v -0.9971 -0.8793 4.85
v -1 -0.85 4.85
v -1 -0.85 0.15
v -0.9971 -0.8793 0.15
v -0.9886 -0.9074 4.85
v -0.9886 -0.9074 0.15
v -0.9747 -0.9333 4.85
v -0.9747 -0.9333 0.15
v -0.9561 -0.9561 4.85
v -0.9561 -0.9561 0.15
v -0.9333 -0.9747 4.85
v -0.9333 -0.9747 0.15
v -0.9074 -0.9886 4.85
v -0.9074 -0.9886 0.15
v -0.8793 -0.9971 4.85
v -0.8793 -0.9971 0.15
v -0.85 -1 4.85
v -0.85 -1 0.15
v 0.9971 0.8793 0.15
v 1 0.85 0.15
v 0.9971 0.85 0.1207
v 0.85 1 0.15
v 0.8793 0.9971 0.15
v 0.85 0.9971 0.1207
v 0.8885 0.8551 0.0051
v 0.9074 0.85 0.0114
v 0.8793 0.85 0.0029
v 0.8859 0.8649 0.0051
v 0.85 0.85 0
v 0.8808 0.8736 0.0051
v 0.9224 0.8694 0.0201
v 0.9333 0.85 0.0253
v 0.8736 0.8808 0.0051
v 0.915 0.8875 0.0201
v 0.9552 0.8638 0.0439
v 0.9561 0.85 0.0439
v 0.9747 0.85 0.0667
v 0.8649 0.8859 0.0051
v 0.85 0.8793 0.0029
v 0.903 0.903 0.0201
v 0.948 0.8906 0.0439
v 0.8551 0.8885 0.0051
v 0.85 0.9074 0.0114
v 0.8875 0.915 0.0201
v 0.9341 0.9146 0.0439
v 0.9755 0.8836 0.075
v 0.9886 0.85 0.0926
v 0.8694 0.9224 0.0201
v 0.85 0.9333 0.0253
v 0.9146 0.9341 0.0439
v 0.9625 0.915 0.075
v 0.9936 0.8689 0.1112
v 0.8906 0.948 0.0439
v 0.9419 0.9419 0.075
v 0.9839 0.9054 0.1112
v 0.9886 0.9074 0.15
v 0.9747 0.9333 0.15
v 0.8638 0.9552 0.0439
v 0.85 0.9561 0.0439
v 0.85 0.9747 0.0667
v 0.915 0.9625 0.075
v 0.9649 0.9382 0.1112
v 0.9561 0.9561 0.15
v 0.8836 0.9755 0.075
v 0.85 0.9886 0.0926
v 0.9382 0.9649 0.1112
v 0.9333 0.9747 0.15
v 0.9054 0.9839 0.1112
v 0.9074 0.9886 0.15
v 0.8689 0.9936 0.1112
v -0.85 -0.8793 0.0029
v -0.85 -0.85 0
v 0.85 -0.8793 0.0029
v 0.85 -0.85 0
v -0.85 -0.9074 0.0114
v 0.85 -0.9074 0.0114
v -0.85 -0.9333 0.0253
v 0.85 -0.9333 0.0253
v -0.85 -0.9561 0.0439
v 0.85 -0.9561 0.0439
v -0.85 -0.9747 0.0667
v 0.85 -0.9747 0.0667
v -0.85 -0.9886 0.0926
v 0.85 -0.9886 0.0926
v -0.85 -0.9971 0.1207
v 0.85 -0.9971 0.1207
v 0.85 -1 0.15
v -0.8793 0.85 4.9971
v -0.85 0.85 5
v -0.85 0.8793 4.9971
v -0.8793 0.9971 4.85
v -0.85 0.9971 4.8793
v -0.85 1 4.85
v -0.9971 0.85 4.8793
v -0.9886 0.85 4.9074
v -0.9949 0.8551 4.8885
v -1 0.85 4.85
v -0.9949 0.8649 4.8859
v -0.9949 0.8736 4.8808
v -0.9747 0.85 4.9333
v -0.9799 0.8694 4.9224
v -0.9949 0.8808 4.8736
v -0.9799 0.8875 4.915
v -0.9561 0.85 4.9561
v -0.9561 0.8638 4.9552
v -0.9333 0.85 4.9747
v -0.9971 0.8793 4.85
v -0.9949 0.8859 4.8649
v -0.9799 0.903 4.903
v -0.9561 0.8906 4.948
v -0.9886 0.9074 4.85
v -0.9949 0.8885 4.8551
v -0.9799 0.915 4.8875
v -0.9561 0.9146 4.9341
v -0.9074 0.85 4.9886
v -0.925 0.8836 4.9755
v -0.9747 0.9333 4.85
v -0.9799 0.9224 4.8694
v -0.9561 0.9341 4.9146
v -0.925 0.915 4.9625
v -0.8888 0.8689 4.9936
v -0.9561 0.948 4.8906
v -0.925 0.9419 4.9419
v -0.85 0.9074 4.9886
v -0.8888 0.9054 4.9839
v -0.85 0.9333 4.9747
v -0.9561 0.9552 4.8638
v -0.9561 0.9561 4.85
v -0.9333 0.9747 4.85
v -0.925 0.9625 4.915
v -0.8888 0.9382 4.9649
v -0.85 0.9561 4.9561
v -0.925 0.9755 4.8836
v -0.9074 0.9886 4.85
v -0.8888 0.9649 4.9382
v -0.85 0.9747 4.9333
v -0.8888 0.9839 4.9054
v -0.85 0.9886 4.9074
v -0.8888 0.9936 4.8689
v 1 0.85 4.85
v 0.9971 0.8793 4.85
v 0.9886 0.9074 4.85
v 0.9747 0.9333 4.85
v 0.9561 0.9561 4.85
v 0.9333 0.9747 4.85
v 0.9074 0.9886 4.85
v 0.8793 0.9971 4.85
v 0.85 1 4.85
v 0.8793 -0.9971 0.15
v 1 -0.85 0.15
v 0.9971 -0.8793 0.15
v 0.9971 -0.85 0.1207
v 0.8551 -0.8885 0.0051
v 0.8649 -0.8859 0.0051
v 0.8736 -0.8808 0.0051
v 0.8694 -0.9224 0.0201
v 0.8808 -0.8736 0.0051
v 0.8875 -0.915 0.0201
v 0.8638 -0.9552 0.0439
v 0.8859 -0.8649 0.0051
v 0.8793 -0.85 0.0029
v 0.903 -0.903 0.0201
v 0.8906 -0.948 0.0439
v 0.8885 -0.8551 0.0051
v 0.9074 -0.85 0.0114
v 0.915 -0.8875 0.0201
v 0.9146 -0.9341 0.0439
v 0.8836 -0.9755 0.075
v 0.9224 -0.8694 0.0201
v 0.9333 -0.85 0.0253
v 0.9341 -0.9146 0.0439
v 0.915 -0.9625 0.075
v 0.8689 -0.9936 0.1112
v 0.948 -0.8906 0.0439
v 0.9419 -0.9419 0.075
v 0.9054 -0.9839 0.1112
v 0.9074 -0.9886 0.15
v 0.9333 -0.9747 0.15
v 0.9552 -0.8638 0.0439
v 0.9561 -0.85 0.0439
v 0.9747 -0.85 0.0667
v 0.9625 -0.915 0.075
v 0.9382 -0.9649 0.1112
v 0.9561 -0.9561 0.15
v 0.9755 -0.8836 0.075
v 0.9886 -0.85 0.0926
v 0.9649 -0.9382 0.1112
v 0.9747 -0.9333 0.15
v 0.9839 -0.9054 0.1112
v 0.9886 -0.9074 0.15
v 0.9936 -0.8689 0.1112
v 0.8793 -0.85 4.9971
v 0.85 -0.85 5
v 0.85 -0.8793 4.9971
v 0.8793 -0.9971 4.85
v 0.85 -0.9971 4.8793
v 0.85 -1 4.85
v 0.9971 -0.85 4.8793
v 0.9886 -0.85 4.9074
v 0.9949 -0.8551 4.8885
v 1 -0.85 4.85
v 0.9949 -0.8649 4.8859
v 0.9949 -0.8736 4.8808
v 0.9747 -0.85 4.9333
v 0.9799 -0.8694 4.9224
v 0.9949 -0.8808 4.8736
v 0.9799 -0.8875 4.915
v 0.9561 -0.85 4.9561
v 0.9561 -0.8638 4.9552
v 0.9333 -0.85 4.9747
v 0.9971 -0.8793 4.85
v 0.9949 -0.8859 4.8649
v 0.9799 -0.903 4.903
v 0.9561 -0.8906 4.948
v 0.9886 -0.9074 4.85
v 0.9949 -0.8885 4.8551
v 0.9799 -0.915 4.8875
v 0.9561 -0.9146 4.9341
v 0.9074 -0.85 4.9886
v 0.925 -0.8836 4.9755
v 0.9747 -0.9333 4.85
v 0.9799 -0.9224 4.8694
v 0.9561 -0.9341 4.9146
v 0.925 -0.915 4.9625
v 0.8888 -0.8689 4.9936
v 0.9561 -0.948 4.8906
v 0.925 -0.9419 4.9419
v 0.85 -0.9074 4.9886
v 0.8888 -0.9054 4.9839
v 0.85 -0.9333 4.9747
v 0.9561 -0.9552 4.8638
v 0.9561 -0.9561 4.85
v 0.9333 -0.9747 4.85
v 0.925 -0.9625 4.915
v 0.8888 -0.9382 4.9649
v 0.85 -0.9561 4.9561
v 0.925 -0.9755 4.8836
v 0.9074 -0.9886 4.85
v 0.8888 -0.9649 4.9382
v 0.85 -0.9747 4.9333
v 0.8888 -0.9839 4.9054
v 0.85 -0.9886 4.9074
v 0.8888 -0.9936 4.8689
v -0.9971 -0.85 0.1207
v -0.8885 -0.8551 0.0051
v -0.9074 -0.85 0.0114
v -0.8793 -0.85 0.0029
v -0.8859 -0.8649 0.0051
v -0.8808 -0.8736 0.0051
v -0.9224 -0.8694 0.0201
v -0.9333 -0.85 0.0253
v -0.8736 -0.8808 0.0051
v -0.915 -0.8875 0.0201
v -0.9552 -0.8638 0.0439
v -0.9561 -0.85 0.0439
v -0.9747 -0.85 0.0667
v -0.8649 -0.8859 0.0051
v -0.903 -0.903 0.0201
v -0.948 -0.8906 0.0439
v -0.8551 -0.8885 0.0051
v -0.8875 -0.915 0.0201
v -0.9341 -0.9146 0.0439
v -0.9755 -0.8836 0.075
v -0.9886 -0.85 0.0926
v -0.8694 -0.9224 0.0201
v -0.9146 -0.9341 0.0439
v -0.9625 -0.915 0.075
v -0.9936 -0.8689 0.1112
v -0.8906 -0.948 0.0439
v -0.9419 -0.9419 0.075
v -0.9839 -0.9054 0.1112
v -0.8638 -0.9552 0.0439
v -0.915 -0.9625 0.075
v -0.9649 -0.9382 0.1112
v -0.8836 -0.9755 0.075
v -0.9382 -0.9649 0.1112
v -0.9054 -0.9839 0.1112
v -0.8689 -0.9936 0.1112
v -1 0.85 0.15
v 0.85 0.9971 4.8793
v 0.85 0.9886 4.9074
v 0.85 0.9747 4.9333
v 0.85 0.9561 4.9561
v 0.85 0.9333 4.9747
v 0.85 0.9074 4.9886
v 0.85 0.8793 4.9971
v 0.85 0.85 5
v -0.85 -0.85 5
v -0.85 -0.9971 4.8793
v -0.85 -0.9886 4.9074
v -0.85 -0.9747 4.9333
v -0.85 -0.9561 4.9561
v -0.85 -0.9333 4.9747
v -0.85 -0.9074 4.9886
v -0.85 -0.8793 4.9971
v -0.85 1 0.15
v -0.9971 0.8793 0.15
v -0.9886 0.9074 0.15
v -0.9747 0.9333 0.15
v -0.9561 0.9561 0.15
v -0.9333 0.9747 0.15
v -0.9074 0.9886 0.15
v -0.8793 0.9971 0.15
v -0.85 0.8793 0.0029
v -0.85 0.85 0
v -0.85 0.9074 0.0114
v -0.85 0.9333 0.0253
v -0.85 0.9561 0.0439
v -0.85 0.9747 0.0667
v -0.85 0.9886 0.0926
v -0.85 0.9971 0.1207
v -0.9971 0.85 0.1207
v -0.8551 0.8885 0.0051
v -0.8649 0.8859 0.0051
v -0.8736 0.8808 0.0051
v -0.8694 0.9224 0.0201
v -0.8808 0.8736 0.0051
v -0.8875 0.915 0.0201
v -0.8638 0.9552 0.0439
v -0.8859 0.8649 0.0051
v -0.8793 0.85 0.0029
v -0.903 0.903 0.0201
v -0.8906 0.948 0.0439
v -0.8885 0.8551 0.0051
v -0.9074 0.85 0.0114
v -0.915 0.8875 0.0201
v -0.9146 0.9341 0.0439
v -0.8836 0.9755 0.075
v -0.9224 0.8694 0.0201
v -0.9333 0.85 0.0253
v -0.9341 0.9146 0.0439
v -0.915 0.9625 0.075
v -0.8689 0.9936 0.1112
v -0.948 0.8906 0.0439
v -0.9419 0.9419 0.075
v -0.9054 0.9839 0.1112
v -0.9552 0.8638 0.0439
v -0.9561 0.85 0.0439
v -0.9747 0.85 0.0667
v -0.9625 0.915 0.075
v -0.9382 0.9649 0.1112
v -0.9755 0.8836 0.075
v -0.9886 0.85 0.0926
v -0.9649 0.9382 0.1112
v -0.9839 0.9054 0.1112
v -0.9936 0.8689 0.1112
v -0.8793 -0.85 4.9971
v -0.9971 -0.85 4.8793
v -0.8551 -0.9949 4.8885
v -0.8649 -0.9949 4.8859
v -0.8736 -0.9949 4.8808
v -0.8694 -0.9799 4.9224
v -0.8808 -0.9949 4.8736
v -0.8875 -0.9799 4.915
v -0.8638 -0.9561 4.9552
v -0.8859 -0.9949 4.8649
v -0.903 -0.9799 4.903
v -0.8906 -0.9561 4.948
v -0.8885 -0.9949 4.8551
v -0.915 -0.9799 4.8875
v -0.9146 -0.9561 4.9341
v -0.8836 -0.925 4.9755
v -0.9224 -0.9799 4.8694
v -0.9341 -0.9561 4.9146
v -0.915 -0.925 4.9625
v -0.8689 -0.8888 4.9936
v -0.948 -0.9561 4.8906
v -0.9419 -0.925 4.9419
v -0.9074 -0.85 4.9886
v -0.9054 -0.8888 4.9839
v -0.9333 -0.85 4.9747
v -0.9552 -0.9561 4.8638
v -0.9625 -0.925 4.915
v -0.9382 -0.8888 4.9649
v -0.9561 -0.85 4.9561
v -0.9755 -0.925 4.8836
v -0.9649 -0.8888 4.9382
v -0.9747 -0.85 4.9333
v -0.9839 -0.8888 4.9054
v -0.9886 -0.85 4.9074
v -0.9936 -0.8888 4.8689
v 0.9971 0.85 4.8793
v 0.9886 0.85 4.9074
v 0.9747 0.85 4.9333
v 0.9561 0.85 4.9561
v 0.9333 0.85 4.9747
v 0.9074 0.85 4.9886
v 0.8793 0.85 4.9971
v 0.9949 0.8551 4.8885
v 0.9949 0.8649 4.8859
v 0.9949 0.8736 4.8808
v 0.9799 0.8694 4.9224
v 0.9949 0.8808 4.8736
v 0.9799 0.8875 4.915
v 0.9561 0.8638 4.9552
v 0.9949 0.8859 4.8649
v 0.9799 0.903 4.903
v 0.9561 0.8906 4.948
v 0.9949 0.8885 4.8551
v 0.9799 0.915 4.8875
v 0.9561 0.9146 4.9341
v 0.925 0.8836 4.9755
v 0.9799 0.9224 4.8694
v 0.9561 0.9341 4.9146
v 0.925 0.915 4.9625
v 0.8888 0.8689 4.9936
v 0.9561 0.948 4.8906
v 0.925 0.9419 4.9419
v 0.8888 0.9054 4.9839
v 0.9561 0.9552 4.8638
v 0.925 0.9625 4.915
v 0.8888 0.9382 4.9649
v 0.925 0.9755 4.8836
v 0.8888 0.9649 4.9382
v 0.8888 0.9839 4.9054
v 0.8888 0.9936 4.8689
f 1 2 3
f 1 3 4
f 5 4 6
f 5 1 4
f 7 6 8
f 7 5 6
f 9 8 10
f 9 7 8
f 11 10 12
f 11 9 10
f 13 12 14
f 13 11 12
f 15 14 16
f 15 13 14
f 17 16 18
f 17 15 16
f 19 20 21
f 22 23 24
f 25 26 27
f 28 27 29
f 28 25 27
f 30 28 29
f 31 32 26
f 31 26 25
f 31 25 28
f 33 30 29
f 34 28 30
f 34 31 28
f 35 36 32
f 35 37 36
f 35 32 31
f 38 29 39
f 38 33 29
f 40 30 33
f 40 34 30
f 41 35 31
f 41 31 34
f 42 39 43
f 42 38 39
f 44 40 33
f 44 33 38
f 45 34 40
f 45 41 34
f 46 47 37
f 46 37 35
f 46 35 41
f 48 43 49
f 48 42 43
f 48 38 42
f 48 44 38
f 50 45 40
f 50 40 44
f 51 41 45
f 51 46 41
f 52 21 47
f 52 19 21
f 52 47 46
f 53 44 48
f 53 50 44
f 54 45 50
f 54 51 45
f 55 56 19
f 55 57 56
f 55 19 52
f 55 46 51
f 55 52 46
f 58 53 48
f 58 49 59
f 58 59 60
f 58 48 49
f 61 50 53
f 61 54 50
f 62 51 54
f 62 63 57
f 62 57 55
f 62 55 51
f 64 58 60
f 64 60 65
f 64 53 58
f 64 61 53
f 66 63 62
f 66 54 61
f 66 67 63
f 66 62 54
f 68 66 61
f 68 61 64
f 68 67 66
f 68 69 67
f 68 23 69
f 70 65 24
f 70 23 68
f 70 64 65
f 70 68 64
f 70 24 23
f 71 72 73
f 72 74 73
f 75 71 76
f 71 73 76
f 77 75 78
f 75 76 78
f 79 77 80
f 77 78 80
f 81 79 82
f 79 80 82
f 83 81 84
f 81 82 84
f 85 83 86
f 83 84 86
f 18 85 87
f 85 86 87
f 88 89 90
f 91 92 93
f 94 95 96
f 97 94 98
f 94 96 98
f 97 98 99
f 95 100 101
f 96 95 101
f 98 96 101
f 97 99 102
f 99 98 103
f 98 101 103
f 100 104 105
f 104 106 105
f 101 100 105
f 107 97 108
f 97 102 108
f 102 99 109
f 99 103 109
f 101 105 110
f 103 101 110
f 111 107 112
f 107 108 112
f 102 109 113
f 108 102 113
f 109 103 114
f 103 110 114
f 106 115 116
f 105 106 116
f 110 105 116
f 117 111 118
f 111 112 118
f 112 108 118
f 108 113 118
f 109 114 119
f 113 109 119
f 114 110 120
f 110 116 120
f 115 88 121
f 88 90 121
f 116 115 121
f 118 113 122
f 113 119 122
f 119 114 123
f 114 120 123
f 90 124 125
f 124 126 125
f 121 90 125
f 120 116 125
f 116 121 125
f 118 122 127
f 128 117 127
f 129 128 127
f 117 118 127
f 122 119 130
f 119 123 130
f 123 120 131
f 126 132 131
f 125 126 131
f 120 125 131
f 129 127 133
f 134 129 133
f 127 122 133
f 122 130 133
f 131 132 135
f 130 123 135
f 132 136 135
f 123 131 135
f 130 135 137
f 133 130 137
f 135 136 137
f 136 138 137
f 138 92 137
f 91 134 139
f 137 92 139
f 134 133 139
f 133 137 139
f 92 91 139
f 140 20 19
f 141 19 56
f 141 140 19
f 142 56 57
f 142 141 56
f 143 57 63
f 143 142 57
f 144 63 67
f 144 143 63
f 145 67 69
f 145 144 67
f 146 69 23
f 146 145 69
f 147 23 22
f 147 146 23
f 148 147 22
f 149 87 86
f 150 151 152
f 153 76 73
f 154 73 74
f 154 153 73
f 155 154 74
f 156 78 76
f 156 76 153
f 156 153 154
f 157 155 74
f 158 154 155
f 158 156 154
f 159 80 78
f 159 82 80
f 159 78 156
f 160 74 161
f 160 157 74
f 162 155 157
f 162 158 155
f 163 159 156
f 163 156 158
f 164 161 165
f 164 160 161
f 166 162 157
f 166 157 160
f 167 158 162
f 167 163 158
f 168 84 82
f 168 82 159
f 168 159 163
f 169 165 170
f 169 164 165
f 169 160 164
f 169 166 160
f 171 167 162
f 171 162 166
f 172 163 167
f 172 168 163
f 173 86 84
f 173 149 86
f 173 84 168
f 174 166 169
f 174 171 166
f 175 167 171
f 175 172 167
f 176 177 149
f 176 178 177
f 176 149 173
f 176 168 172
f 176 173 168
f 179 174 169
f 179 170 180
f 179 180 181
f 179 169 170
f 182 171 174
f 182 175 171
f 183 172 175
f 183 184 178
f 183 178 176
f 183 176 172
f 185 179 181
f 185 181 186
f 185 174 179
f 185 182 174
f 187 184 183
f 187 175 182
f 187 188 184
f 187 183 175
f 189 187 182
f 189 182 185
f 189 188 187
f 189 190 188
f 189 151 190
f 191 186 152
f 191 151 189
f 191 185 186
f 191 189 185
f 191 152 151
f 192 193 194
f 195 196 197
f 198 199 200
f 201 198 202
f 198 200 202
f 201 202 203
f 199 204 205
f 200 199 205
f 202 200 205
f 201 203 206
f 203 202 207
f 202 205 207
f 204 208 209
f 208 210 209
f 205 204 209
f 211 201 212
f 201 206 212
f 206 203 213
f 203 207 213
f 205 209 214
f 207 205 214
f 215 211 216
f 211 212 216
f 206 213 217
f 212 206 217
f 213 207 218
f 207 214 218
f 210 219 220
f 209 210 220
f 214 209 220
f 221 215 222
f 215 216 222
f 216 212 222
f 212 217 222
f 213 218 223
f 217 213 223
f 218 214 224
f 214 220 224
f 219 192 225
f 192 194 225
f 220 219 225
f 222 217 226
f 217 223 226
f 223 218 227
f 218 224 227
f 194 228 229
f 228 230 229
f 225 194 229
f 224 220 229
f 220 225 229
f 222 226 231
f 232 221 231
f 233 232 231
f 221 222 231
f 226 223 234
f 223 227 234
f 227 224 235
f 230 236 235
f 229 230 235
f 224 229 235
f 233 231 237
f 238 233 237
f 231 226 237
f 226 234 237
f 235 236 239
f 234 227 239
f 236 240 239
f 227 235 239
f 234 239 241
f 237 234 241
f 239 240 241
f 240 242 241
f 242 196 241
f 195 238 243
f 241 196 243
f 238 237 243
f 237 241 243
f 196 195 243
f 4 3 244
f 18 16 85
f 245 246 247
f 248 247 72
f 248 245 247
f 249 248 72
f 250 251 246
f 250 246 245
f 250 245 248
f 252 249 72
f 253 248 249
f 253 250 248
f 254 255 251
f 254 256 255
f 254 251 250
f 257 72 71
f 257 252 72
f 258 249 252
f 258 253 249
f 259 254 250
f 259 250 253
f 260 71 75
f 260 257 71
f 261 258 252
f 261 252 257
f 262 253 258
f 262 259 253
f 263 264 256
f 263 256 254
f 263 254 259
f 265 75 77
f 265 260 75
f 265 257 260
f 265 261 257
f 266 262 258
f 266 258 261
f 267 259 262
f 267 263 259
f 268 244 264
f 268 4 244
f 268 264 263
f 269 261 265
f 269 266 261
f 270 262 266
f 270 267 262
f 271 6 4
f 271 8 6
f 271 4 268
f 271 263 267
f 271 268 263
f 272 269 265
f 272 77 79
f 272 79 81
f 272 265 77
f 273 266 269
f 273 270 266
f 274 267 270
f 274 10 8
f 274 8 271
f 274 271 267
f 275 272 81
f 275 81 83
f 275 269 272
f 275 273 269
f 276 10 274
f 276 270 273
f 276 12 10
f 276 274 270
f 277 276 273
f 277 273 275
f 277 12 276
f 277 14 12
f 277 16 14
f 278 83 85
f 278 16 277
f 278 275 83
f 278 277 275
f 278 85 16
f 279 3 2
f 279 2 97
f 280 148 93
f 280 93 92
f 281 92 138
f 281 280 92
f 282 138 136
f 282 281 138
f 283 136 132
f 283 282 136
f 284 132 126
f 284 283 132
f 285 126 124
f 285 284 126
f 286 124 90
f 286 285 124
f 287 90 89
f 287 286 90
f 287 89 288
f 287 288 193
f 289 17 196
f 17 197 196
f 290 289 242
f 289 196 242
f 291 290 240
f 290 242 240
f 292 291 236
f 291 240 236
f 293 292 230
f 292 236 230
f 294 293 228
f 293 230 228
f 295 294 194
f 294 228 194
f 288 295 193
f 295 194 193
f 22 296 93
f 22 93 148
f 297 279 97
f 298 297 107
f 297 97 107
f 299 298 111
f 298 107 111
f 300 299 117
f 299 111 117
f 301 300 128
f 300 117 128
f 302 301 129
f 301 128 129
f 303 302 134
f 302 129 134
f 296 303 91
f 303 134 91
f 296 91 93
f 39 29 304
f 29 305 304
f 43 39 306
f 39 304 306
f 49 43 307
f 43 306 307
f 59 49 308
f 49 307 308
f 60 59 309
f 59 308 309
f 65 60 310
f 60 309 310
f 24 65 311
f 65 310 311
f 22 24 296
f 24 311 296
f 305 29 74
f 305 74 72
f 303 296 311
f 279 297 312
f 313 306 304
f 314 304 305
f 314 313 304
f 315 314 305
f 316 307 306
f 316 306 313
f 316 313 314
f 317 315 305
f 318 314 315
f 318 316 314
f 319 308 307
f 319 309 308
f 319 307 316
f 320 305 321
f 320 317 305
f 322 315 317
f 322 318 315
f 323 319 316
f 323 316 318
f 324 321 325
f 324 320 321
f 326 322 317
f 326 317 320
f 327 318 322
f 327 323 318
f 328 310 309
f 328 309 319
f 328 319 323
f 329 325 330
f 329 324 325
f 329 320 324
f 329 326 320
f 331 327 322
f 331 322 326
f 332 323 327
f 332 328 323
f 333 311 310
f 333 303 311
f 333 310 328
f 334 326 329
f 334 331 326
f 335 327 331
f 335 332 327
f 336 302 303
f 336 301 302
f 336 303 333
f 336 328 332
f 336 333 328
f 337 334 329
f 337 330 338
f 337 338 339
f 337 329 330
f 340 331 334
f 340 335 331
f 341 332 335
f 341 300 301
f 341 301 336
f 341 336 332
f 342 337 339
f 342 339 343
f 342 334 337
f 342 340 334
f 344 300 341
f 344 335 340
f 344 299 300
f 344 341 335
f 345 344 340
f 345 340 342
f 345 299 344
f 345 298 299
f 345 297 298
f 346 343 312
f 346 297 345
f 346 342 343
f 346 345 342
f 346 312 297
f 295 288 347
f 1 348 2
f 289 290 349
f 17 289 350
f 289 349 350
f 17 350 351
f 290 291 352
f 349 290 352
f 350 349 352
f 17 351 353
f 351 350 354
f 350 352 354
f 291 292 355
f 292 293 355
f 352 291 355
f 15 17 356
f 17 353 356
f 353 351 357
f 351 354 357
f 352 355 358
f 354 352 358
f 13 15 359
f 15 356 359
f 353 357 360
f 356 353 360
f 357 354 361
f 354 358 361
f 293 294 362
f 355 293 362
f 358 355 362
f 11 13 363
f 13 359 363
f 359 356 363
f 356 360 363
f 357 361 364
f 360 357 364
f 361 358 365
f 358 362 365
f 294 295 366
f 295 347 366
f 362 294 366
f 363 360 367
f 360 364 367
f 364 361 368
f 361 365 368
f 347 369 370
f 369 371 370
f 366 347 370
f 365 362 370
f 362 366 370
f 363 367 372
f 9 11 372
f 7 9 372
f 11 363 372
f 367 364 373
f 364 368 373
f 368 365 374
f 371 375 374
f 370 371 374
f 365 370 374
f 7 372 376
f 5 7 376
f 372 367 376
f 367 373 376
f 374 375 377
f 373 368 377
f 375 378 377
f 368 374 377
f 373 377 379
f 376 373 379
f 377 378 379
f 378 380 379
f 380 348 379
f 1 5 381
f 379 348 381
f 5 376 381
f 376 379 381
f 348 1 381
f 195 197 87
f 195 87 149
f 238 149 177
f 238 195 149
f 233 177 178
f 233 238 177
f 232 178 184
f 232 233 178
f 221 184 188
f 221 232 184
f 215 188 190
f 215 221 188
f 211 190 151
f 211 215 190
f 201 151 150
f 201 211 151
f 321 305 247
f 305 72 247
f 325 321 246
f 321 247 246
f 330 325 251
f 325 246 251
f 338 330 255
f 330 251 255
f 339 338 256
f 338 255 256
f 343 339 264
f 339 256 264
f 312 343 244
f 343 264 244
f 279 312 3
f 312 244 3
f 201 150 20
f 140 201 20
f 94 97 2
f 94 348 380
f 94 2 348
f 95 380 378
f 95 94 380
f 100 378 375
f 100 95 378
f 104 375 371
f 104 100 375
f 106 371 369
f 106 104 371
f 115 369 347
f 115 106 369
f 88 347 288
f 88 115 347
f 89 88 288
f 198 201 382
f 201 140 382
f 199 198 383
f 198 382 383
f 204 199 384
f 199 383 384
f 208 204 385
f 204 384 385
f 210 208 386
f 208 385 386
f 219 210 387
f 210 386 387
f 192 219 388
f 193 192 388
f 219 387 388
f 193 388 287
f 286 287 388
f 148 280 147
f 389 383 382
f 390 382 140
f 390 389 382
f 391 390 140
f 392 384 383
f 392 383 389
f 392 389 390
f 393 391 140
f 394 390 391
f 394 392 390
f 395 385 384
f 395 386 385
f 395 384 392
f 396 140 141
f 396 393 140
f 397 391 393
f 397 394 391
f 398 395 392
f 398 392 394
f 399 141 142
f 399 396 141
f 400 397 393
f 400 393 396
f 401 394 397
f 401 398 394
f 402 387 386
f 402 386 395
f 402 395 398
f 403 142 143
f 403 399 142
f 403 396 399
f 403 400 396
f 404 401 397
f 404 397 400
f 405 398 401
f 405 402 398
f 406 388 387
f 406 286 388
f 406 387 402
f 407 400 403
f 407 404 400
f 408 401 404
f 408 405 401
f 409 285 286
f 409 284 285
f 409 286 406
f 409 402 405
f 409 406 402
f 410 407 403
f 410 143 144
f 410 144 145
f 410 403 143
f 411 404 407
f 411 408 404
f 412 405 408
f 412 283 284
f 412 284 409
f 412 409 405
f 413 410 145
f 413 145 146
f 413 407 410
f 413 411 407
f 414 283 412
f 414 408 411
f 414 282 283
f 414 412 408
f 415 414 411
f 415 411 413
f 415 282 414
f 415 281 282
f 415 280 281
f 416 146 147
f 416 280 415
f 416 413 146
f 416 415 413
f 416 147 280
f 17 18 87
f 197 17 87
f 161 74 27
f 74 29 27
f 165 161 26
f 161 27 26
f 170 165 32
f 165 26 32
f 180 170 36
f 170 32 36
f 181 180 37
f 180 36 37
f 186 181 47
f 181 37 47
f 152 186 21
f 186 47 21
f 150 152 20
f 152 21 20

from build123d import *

# Parameters (mm, degrees)
BOSS_EXTRUDE1_DEPTH      = 5
BOSS_EXTRUDE1_DEPTH_BACK = 5
SKETCH3_W                = 2
SKETCH3_H                = 2
FILLET2_R                = 0.15
SKETCH4_W                = 2
SKETCH4_H                = 2
CUT_EXTRUDE1_DEPTH       = 5
FILLET3_R                = 0.15


with BuildPart() as part:
    # Sketch3 → Boss-Extrude1 (new, two sides: drawn at the far end of the back side and taken through both)
    with BuildSketch(Plane.XY.offset(-BOSS_EXTRUDE1_DEPTH_BACK)):
        Rectangle(SKETCH3_W, SKETCH3_H)
    extrude(amount=BOSS_EXTRUDE1_DEPTH + BOSS_EXTRUDE1_DEPTH_BACK)

    # Fillet2
    fillet2_edges = [part.edges().sort_by_distance(p)[0] for p in [
        (0, 1, 5),
        (0, -1, -5),
        (-1, 0, -5),
        (0, 1, -5),
        (1, 0, -5),
        (-1, 0, 5),
        (0, -1, 5),
        (1, 0, 5),
        (-1, -1, 0),
        (-1, 1, 0),
        (1, 1, 0),
        (1, -1, 0),
    ]]
    fillet(fillet2_edges, radius=FILLET2_R)

    # Sketch4 → Cut-Extrude1 (cut)
    with BuildSketch(Plane(origin=(0, 0, -5), x_dir=(-1, 0, 0), z_dir=(0, 0, -1))):
        Rectangle(SKETCH4_W, SKETCH4_H)
    extrude(amount=-CUT_EXTRUDE1_DEPTH, mode=Mode.SUBTRACT)

    # Fillet3
    fillet3_edges = [part.edges().sort_by_distance(p)[0] for p in [
        (1, 0, 0),
        (0, -1, 0),
        (0.956066017, 0.956066017, 0),
        (0.956066017, -0.956066017, 0),
        (-0.956066017, 0.956066017, 0),
        (-1, 0, 0),
        (0, 1, 0),
        (-0.956066017, -0.956066017, 0),
    ]]
    fillet(fillet3_edges, radius=FILLET3_R)


solid = part.part
